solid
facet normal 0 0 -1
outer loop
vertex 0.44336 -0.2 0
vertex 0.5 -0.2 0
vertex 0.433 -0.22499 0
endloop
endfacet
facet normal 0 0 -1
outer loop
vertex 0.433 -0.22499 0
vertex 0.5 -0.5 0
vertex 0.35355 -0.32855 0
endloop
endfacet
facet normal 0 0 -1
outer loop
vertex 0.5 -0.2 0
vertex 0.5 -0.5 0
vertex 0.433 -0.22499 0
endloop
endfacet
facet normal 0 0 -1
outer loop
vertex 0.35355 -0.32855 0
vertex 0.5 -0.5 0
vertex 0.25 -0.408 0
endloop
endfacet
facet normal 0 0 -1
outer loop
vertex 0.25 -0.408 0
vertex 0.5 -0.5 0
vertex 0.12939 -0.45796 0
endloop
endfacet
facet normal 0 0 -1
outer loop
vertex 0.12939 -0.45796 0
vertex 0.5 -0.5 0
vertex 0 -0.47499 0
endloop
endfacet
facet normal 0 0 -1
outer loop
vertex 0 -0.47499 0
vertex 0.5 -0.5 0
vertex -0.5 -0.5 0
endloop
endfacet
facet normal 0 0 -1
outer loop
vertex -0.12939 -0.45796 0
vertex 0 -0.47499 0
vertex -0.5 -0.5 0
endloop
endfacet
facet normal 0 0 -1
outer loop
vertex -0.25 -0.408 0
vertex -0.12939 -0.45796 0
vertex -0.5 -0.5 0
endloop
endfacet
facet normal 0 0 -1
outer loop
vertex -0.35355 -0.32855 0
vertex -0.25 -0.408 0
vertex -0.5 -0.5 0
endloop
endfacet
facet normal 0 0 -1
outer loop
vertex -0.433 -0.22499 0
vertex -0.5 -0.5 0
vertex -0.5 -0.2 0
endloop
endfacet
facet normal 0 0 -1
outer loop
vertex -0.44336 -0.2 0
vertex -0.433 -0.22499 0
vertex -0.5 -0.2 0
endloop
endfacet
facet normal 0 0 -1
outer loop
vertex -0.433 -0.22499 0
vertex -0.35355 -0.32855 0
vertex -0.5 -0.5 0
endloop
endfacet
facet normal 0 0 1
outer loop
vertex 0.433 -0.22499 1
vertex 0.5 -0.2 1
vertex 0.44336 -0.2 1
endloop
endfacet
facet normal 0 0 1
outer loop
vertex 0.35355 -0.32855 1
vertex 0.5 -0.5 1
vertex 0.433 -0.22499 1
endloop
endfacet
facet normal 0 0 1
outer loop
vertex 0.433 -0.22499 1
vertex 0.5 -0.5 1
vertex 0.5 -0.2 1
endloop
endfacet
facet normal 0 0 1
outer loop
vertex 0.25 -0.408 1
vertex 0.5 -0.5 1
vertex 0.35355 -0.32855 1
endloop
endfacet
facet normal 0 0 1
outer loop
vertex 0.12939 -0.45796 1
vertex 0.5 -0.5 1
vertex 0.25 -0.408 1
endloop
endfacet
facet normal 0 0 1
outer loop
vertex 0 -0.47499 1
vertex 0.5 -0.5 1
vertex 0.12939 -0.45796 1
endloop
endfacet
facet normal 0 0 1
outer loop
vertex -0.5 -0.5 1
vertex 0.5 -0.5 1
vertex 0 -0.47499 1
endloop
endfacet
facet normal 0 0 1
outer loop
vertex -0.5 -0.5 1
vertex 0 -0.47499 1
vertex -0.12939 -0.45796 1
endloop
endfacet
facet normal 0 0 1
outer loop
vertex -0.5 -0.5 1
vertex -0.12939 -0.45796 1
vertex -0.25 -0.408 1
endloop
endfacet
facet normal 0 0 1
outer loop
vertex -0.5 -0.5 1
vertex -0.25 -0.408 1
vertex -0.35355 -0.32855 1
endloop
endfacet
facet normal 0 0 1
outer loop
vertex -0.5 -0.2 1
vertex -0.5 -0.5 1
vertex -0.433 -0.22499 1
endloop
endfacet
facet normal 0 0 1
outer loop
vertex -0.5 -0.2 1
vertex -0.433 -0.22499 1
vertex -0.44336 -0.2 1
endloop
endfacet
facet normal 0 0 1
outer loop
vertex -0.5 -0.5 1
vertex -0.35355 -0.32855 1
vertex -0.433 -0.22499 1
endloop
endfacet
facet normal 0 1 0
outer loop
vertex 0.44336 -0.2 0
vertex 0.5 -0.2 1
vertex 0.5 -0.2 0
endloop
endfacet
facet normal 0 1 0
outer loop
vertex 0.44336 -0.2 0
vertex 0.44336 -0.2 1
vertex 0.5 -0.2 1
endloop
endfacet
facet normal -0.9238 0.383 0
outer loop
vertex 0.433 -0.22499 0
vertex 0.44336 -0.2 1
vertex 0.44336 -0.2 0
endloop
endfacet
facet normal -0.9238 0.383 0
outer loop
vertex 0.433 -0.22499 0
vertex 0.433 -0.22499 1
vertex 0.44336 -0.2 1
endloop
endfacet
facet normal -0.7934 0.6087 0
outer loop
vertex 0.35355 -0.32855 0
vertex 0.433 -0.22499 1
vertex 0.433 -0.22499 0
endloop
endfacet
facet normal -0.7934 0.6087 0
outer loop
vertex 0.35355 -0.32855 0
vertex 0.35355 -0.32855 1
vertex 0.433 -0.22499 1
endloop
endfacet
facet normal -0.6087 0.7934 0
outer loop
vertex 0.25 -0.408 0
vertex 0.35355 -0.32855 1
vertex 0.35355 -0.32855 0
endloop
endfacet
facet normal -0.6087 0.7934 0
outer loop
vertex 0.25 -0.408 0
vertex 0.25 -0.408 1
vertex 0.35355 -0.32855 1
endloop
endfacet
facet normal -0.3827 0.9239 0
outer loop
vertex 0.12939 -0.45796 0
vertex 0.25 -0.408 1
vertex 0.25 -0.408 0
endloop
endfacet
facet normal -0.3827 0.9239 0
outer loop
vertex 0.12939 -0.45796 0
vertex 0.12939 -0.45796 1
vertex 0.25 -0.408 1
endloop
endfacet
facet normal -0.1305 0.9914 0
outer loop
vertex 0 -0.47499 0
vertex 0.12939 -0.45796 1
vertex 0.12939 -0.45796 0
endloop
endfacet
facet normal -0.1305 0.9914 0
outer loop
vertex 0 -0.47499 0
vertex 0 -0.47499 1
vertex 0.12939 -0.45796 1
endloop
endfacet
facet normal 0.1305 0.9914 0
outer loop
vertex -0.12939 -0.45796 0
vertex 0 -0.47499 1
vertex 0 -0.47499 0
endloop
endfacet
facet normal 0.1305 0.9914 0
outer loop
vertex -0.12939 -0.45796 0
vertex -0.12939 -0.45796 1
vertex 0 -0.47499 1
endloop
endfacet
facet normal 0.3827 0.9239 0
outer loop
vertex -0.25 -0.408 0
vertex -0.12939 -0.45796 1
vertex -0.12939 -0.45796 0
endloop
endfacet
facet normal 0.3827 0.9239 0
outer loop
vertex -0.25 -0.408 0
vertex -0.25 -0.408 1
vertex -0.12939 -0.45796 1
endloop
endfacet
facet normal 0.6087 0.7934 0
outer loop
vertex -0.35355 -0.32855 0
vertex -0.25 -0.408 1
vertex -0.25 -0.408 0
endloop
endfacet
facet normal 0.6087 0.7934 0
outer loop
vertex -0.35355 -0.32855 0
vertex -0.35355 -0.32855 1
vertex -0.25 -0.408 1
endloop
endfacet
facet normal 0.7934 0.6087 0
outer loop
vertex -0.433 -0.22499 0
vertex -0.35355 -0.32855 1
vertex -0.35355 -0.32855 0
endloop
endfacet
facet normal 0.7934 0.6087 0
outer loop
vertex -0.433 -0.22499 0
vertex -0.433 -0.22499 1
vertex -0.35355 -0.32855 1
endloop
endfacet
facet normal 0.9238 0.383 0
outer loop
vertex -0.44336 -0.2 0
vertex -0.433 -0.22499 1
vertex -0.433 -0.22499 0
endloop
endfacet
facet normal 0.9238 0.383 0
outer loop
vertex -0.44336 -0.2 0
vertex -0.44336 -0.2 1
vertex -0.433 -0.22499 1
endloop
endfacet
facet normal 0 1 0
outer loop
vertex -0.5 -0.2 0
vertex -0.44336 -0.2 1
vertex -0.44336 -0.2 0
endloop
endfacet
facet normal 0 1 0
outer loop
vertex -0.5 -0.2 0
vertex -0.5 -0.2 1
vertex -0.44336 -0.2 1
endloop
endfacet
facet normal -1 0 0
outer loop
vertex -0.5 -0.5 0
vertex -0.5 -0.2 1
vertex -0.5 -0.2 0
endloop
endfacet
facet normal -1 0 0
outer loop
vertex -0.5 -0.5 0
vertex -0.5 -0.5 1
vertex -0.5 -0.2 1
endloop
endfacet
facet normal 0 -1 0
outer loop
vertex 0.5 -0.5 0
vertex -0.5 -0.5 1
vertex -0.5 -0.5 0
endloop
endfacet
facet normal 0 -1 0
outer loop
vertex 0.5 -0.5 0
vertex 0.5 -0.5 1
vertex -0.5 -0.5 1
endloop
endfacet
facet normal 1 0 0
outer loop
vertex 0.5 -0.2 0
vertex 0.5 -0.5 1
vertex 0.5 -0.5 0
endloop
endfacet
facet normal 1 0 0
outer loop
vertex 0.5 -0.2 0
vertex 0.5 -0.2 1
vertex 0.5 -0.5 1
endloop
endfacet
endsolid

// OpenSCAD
// Carousel Autoloader 0.2.23 - bustle cradle (goot) on unit calibre, extruded along z over length 1.
// One cradle per round cell: the material lies only in the two lower cusps of the cell
// [-0.5,0.5] x [-0.5,-0.5+h], outside the round, so cradles of touching rounds and of the
// layer below never intersect a true-size round. The circle is lifted by eps, which leaves
// a thin floor under the round (eps intrudes only into the tangent point of the layer below).
h = 0.30; eps = 0.025;
fn = 24;      // 24 (default) or 8 (light level for very full racks, matches the 8-sided rounds)
linear_extrude(height = 1)
  difference() {
    translate([-0.5, -0.5]) square([1, h]);
    translate([0, eps]) circle(r = 0.5, $fn = fn);
  }
